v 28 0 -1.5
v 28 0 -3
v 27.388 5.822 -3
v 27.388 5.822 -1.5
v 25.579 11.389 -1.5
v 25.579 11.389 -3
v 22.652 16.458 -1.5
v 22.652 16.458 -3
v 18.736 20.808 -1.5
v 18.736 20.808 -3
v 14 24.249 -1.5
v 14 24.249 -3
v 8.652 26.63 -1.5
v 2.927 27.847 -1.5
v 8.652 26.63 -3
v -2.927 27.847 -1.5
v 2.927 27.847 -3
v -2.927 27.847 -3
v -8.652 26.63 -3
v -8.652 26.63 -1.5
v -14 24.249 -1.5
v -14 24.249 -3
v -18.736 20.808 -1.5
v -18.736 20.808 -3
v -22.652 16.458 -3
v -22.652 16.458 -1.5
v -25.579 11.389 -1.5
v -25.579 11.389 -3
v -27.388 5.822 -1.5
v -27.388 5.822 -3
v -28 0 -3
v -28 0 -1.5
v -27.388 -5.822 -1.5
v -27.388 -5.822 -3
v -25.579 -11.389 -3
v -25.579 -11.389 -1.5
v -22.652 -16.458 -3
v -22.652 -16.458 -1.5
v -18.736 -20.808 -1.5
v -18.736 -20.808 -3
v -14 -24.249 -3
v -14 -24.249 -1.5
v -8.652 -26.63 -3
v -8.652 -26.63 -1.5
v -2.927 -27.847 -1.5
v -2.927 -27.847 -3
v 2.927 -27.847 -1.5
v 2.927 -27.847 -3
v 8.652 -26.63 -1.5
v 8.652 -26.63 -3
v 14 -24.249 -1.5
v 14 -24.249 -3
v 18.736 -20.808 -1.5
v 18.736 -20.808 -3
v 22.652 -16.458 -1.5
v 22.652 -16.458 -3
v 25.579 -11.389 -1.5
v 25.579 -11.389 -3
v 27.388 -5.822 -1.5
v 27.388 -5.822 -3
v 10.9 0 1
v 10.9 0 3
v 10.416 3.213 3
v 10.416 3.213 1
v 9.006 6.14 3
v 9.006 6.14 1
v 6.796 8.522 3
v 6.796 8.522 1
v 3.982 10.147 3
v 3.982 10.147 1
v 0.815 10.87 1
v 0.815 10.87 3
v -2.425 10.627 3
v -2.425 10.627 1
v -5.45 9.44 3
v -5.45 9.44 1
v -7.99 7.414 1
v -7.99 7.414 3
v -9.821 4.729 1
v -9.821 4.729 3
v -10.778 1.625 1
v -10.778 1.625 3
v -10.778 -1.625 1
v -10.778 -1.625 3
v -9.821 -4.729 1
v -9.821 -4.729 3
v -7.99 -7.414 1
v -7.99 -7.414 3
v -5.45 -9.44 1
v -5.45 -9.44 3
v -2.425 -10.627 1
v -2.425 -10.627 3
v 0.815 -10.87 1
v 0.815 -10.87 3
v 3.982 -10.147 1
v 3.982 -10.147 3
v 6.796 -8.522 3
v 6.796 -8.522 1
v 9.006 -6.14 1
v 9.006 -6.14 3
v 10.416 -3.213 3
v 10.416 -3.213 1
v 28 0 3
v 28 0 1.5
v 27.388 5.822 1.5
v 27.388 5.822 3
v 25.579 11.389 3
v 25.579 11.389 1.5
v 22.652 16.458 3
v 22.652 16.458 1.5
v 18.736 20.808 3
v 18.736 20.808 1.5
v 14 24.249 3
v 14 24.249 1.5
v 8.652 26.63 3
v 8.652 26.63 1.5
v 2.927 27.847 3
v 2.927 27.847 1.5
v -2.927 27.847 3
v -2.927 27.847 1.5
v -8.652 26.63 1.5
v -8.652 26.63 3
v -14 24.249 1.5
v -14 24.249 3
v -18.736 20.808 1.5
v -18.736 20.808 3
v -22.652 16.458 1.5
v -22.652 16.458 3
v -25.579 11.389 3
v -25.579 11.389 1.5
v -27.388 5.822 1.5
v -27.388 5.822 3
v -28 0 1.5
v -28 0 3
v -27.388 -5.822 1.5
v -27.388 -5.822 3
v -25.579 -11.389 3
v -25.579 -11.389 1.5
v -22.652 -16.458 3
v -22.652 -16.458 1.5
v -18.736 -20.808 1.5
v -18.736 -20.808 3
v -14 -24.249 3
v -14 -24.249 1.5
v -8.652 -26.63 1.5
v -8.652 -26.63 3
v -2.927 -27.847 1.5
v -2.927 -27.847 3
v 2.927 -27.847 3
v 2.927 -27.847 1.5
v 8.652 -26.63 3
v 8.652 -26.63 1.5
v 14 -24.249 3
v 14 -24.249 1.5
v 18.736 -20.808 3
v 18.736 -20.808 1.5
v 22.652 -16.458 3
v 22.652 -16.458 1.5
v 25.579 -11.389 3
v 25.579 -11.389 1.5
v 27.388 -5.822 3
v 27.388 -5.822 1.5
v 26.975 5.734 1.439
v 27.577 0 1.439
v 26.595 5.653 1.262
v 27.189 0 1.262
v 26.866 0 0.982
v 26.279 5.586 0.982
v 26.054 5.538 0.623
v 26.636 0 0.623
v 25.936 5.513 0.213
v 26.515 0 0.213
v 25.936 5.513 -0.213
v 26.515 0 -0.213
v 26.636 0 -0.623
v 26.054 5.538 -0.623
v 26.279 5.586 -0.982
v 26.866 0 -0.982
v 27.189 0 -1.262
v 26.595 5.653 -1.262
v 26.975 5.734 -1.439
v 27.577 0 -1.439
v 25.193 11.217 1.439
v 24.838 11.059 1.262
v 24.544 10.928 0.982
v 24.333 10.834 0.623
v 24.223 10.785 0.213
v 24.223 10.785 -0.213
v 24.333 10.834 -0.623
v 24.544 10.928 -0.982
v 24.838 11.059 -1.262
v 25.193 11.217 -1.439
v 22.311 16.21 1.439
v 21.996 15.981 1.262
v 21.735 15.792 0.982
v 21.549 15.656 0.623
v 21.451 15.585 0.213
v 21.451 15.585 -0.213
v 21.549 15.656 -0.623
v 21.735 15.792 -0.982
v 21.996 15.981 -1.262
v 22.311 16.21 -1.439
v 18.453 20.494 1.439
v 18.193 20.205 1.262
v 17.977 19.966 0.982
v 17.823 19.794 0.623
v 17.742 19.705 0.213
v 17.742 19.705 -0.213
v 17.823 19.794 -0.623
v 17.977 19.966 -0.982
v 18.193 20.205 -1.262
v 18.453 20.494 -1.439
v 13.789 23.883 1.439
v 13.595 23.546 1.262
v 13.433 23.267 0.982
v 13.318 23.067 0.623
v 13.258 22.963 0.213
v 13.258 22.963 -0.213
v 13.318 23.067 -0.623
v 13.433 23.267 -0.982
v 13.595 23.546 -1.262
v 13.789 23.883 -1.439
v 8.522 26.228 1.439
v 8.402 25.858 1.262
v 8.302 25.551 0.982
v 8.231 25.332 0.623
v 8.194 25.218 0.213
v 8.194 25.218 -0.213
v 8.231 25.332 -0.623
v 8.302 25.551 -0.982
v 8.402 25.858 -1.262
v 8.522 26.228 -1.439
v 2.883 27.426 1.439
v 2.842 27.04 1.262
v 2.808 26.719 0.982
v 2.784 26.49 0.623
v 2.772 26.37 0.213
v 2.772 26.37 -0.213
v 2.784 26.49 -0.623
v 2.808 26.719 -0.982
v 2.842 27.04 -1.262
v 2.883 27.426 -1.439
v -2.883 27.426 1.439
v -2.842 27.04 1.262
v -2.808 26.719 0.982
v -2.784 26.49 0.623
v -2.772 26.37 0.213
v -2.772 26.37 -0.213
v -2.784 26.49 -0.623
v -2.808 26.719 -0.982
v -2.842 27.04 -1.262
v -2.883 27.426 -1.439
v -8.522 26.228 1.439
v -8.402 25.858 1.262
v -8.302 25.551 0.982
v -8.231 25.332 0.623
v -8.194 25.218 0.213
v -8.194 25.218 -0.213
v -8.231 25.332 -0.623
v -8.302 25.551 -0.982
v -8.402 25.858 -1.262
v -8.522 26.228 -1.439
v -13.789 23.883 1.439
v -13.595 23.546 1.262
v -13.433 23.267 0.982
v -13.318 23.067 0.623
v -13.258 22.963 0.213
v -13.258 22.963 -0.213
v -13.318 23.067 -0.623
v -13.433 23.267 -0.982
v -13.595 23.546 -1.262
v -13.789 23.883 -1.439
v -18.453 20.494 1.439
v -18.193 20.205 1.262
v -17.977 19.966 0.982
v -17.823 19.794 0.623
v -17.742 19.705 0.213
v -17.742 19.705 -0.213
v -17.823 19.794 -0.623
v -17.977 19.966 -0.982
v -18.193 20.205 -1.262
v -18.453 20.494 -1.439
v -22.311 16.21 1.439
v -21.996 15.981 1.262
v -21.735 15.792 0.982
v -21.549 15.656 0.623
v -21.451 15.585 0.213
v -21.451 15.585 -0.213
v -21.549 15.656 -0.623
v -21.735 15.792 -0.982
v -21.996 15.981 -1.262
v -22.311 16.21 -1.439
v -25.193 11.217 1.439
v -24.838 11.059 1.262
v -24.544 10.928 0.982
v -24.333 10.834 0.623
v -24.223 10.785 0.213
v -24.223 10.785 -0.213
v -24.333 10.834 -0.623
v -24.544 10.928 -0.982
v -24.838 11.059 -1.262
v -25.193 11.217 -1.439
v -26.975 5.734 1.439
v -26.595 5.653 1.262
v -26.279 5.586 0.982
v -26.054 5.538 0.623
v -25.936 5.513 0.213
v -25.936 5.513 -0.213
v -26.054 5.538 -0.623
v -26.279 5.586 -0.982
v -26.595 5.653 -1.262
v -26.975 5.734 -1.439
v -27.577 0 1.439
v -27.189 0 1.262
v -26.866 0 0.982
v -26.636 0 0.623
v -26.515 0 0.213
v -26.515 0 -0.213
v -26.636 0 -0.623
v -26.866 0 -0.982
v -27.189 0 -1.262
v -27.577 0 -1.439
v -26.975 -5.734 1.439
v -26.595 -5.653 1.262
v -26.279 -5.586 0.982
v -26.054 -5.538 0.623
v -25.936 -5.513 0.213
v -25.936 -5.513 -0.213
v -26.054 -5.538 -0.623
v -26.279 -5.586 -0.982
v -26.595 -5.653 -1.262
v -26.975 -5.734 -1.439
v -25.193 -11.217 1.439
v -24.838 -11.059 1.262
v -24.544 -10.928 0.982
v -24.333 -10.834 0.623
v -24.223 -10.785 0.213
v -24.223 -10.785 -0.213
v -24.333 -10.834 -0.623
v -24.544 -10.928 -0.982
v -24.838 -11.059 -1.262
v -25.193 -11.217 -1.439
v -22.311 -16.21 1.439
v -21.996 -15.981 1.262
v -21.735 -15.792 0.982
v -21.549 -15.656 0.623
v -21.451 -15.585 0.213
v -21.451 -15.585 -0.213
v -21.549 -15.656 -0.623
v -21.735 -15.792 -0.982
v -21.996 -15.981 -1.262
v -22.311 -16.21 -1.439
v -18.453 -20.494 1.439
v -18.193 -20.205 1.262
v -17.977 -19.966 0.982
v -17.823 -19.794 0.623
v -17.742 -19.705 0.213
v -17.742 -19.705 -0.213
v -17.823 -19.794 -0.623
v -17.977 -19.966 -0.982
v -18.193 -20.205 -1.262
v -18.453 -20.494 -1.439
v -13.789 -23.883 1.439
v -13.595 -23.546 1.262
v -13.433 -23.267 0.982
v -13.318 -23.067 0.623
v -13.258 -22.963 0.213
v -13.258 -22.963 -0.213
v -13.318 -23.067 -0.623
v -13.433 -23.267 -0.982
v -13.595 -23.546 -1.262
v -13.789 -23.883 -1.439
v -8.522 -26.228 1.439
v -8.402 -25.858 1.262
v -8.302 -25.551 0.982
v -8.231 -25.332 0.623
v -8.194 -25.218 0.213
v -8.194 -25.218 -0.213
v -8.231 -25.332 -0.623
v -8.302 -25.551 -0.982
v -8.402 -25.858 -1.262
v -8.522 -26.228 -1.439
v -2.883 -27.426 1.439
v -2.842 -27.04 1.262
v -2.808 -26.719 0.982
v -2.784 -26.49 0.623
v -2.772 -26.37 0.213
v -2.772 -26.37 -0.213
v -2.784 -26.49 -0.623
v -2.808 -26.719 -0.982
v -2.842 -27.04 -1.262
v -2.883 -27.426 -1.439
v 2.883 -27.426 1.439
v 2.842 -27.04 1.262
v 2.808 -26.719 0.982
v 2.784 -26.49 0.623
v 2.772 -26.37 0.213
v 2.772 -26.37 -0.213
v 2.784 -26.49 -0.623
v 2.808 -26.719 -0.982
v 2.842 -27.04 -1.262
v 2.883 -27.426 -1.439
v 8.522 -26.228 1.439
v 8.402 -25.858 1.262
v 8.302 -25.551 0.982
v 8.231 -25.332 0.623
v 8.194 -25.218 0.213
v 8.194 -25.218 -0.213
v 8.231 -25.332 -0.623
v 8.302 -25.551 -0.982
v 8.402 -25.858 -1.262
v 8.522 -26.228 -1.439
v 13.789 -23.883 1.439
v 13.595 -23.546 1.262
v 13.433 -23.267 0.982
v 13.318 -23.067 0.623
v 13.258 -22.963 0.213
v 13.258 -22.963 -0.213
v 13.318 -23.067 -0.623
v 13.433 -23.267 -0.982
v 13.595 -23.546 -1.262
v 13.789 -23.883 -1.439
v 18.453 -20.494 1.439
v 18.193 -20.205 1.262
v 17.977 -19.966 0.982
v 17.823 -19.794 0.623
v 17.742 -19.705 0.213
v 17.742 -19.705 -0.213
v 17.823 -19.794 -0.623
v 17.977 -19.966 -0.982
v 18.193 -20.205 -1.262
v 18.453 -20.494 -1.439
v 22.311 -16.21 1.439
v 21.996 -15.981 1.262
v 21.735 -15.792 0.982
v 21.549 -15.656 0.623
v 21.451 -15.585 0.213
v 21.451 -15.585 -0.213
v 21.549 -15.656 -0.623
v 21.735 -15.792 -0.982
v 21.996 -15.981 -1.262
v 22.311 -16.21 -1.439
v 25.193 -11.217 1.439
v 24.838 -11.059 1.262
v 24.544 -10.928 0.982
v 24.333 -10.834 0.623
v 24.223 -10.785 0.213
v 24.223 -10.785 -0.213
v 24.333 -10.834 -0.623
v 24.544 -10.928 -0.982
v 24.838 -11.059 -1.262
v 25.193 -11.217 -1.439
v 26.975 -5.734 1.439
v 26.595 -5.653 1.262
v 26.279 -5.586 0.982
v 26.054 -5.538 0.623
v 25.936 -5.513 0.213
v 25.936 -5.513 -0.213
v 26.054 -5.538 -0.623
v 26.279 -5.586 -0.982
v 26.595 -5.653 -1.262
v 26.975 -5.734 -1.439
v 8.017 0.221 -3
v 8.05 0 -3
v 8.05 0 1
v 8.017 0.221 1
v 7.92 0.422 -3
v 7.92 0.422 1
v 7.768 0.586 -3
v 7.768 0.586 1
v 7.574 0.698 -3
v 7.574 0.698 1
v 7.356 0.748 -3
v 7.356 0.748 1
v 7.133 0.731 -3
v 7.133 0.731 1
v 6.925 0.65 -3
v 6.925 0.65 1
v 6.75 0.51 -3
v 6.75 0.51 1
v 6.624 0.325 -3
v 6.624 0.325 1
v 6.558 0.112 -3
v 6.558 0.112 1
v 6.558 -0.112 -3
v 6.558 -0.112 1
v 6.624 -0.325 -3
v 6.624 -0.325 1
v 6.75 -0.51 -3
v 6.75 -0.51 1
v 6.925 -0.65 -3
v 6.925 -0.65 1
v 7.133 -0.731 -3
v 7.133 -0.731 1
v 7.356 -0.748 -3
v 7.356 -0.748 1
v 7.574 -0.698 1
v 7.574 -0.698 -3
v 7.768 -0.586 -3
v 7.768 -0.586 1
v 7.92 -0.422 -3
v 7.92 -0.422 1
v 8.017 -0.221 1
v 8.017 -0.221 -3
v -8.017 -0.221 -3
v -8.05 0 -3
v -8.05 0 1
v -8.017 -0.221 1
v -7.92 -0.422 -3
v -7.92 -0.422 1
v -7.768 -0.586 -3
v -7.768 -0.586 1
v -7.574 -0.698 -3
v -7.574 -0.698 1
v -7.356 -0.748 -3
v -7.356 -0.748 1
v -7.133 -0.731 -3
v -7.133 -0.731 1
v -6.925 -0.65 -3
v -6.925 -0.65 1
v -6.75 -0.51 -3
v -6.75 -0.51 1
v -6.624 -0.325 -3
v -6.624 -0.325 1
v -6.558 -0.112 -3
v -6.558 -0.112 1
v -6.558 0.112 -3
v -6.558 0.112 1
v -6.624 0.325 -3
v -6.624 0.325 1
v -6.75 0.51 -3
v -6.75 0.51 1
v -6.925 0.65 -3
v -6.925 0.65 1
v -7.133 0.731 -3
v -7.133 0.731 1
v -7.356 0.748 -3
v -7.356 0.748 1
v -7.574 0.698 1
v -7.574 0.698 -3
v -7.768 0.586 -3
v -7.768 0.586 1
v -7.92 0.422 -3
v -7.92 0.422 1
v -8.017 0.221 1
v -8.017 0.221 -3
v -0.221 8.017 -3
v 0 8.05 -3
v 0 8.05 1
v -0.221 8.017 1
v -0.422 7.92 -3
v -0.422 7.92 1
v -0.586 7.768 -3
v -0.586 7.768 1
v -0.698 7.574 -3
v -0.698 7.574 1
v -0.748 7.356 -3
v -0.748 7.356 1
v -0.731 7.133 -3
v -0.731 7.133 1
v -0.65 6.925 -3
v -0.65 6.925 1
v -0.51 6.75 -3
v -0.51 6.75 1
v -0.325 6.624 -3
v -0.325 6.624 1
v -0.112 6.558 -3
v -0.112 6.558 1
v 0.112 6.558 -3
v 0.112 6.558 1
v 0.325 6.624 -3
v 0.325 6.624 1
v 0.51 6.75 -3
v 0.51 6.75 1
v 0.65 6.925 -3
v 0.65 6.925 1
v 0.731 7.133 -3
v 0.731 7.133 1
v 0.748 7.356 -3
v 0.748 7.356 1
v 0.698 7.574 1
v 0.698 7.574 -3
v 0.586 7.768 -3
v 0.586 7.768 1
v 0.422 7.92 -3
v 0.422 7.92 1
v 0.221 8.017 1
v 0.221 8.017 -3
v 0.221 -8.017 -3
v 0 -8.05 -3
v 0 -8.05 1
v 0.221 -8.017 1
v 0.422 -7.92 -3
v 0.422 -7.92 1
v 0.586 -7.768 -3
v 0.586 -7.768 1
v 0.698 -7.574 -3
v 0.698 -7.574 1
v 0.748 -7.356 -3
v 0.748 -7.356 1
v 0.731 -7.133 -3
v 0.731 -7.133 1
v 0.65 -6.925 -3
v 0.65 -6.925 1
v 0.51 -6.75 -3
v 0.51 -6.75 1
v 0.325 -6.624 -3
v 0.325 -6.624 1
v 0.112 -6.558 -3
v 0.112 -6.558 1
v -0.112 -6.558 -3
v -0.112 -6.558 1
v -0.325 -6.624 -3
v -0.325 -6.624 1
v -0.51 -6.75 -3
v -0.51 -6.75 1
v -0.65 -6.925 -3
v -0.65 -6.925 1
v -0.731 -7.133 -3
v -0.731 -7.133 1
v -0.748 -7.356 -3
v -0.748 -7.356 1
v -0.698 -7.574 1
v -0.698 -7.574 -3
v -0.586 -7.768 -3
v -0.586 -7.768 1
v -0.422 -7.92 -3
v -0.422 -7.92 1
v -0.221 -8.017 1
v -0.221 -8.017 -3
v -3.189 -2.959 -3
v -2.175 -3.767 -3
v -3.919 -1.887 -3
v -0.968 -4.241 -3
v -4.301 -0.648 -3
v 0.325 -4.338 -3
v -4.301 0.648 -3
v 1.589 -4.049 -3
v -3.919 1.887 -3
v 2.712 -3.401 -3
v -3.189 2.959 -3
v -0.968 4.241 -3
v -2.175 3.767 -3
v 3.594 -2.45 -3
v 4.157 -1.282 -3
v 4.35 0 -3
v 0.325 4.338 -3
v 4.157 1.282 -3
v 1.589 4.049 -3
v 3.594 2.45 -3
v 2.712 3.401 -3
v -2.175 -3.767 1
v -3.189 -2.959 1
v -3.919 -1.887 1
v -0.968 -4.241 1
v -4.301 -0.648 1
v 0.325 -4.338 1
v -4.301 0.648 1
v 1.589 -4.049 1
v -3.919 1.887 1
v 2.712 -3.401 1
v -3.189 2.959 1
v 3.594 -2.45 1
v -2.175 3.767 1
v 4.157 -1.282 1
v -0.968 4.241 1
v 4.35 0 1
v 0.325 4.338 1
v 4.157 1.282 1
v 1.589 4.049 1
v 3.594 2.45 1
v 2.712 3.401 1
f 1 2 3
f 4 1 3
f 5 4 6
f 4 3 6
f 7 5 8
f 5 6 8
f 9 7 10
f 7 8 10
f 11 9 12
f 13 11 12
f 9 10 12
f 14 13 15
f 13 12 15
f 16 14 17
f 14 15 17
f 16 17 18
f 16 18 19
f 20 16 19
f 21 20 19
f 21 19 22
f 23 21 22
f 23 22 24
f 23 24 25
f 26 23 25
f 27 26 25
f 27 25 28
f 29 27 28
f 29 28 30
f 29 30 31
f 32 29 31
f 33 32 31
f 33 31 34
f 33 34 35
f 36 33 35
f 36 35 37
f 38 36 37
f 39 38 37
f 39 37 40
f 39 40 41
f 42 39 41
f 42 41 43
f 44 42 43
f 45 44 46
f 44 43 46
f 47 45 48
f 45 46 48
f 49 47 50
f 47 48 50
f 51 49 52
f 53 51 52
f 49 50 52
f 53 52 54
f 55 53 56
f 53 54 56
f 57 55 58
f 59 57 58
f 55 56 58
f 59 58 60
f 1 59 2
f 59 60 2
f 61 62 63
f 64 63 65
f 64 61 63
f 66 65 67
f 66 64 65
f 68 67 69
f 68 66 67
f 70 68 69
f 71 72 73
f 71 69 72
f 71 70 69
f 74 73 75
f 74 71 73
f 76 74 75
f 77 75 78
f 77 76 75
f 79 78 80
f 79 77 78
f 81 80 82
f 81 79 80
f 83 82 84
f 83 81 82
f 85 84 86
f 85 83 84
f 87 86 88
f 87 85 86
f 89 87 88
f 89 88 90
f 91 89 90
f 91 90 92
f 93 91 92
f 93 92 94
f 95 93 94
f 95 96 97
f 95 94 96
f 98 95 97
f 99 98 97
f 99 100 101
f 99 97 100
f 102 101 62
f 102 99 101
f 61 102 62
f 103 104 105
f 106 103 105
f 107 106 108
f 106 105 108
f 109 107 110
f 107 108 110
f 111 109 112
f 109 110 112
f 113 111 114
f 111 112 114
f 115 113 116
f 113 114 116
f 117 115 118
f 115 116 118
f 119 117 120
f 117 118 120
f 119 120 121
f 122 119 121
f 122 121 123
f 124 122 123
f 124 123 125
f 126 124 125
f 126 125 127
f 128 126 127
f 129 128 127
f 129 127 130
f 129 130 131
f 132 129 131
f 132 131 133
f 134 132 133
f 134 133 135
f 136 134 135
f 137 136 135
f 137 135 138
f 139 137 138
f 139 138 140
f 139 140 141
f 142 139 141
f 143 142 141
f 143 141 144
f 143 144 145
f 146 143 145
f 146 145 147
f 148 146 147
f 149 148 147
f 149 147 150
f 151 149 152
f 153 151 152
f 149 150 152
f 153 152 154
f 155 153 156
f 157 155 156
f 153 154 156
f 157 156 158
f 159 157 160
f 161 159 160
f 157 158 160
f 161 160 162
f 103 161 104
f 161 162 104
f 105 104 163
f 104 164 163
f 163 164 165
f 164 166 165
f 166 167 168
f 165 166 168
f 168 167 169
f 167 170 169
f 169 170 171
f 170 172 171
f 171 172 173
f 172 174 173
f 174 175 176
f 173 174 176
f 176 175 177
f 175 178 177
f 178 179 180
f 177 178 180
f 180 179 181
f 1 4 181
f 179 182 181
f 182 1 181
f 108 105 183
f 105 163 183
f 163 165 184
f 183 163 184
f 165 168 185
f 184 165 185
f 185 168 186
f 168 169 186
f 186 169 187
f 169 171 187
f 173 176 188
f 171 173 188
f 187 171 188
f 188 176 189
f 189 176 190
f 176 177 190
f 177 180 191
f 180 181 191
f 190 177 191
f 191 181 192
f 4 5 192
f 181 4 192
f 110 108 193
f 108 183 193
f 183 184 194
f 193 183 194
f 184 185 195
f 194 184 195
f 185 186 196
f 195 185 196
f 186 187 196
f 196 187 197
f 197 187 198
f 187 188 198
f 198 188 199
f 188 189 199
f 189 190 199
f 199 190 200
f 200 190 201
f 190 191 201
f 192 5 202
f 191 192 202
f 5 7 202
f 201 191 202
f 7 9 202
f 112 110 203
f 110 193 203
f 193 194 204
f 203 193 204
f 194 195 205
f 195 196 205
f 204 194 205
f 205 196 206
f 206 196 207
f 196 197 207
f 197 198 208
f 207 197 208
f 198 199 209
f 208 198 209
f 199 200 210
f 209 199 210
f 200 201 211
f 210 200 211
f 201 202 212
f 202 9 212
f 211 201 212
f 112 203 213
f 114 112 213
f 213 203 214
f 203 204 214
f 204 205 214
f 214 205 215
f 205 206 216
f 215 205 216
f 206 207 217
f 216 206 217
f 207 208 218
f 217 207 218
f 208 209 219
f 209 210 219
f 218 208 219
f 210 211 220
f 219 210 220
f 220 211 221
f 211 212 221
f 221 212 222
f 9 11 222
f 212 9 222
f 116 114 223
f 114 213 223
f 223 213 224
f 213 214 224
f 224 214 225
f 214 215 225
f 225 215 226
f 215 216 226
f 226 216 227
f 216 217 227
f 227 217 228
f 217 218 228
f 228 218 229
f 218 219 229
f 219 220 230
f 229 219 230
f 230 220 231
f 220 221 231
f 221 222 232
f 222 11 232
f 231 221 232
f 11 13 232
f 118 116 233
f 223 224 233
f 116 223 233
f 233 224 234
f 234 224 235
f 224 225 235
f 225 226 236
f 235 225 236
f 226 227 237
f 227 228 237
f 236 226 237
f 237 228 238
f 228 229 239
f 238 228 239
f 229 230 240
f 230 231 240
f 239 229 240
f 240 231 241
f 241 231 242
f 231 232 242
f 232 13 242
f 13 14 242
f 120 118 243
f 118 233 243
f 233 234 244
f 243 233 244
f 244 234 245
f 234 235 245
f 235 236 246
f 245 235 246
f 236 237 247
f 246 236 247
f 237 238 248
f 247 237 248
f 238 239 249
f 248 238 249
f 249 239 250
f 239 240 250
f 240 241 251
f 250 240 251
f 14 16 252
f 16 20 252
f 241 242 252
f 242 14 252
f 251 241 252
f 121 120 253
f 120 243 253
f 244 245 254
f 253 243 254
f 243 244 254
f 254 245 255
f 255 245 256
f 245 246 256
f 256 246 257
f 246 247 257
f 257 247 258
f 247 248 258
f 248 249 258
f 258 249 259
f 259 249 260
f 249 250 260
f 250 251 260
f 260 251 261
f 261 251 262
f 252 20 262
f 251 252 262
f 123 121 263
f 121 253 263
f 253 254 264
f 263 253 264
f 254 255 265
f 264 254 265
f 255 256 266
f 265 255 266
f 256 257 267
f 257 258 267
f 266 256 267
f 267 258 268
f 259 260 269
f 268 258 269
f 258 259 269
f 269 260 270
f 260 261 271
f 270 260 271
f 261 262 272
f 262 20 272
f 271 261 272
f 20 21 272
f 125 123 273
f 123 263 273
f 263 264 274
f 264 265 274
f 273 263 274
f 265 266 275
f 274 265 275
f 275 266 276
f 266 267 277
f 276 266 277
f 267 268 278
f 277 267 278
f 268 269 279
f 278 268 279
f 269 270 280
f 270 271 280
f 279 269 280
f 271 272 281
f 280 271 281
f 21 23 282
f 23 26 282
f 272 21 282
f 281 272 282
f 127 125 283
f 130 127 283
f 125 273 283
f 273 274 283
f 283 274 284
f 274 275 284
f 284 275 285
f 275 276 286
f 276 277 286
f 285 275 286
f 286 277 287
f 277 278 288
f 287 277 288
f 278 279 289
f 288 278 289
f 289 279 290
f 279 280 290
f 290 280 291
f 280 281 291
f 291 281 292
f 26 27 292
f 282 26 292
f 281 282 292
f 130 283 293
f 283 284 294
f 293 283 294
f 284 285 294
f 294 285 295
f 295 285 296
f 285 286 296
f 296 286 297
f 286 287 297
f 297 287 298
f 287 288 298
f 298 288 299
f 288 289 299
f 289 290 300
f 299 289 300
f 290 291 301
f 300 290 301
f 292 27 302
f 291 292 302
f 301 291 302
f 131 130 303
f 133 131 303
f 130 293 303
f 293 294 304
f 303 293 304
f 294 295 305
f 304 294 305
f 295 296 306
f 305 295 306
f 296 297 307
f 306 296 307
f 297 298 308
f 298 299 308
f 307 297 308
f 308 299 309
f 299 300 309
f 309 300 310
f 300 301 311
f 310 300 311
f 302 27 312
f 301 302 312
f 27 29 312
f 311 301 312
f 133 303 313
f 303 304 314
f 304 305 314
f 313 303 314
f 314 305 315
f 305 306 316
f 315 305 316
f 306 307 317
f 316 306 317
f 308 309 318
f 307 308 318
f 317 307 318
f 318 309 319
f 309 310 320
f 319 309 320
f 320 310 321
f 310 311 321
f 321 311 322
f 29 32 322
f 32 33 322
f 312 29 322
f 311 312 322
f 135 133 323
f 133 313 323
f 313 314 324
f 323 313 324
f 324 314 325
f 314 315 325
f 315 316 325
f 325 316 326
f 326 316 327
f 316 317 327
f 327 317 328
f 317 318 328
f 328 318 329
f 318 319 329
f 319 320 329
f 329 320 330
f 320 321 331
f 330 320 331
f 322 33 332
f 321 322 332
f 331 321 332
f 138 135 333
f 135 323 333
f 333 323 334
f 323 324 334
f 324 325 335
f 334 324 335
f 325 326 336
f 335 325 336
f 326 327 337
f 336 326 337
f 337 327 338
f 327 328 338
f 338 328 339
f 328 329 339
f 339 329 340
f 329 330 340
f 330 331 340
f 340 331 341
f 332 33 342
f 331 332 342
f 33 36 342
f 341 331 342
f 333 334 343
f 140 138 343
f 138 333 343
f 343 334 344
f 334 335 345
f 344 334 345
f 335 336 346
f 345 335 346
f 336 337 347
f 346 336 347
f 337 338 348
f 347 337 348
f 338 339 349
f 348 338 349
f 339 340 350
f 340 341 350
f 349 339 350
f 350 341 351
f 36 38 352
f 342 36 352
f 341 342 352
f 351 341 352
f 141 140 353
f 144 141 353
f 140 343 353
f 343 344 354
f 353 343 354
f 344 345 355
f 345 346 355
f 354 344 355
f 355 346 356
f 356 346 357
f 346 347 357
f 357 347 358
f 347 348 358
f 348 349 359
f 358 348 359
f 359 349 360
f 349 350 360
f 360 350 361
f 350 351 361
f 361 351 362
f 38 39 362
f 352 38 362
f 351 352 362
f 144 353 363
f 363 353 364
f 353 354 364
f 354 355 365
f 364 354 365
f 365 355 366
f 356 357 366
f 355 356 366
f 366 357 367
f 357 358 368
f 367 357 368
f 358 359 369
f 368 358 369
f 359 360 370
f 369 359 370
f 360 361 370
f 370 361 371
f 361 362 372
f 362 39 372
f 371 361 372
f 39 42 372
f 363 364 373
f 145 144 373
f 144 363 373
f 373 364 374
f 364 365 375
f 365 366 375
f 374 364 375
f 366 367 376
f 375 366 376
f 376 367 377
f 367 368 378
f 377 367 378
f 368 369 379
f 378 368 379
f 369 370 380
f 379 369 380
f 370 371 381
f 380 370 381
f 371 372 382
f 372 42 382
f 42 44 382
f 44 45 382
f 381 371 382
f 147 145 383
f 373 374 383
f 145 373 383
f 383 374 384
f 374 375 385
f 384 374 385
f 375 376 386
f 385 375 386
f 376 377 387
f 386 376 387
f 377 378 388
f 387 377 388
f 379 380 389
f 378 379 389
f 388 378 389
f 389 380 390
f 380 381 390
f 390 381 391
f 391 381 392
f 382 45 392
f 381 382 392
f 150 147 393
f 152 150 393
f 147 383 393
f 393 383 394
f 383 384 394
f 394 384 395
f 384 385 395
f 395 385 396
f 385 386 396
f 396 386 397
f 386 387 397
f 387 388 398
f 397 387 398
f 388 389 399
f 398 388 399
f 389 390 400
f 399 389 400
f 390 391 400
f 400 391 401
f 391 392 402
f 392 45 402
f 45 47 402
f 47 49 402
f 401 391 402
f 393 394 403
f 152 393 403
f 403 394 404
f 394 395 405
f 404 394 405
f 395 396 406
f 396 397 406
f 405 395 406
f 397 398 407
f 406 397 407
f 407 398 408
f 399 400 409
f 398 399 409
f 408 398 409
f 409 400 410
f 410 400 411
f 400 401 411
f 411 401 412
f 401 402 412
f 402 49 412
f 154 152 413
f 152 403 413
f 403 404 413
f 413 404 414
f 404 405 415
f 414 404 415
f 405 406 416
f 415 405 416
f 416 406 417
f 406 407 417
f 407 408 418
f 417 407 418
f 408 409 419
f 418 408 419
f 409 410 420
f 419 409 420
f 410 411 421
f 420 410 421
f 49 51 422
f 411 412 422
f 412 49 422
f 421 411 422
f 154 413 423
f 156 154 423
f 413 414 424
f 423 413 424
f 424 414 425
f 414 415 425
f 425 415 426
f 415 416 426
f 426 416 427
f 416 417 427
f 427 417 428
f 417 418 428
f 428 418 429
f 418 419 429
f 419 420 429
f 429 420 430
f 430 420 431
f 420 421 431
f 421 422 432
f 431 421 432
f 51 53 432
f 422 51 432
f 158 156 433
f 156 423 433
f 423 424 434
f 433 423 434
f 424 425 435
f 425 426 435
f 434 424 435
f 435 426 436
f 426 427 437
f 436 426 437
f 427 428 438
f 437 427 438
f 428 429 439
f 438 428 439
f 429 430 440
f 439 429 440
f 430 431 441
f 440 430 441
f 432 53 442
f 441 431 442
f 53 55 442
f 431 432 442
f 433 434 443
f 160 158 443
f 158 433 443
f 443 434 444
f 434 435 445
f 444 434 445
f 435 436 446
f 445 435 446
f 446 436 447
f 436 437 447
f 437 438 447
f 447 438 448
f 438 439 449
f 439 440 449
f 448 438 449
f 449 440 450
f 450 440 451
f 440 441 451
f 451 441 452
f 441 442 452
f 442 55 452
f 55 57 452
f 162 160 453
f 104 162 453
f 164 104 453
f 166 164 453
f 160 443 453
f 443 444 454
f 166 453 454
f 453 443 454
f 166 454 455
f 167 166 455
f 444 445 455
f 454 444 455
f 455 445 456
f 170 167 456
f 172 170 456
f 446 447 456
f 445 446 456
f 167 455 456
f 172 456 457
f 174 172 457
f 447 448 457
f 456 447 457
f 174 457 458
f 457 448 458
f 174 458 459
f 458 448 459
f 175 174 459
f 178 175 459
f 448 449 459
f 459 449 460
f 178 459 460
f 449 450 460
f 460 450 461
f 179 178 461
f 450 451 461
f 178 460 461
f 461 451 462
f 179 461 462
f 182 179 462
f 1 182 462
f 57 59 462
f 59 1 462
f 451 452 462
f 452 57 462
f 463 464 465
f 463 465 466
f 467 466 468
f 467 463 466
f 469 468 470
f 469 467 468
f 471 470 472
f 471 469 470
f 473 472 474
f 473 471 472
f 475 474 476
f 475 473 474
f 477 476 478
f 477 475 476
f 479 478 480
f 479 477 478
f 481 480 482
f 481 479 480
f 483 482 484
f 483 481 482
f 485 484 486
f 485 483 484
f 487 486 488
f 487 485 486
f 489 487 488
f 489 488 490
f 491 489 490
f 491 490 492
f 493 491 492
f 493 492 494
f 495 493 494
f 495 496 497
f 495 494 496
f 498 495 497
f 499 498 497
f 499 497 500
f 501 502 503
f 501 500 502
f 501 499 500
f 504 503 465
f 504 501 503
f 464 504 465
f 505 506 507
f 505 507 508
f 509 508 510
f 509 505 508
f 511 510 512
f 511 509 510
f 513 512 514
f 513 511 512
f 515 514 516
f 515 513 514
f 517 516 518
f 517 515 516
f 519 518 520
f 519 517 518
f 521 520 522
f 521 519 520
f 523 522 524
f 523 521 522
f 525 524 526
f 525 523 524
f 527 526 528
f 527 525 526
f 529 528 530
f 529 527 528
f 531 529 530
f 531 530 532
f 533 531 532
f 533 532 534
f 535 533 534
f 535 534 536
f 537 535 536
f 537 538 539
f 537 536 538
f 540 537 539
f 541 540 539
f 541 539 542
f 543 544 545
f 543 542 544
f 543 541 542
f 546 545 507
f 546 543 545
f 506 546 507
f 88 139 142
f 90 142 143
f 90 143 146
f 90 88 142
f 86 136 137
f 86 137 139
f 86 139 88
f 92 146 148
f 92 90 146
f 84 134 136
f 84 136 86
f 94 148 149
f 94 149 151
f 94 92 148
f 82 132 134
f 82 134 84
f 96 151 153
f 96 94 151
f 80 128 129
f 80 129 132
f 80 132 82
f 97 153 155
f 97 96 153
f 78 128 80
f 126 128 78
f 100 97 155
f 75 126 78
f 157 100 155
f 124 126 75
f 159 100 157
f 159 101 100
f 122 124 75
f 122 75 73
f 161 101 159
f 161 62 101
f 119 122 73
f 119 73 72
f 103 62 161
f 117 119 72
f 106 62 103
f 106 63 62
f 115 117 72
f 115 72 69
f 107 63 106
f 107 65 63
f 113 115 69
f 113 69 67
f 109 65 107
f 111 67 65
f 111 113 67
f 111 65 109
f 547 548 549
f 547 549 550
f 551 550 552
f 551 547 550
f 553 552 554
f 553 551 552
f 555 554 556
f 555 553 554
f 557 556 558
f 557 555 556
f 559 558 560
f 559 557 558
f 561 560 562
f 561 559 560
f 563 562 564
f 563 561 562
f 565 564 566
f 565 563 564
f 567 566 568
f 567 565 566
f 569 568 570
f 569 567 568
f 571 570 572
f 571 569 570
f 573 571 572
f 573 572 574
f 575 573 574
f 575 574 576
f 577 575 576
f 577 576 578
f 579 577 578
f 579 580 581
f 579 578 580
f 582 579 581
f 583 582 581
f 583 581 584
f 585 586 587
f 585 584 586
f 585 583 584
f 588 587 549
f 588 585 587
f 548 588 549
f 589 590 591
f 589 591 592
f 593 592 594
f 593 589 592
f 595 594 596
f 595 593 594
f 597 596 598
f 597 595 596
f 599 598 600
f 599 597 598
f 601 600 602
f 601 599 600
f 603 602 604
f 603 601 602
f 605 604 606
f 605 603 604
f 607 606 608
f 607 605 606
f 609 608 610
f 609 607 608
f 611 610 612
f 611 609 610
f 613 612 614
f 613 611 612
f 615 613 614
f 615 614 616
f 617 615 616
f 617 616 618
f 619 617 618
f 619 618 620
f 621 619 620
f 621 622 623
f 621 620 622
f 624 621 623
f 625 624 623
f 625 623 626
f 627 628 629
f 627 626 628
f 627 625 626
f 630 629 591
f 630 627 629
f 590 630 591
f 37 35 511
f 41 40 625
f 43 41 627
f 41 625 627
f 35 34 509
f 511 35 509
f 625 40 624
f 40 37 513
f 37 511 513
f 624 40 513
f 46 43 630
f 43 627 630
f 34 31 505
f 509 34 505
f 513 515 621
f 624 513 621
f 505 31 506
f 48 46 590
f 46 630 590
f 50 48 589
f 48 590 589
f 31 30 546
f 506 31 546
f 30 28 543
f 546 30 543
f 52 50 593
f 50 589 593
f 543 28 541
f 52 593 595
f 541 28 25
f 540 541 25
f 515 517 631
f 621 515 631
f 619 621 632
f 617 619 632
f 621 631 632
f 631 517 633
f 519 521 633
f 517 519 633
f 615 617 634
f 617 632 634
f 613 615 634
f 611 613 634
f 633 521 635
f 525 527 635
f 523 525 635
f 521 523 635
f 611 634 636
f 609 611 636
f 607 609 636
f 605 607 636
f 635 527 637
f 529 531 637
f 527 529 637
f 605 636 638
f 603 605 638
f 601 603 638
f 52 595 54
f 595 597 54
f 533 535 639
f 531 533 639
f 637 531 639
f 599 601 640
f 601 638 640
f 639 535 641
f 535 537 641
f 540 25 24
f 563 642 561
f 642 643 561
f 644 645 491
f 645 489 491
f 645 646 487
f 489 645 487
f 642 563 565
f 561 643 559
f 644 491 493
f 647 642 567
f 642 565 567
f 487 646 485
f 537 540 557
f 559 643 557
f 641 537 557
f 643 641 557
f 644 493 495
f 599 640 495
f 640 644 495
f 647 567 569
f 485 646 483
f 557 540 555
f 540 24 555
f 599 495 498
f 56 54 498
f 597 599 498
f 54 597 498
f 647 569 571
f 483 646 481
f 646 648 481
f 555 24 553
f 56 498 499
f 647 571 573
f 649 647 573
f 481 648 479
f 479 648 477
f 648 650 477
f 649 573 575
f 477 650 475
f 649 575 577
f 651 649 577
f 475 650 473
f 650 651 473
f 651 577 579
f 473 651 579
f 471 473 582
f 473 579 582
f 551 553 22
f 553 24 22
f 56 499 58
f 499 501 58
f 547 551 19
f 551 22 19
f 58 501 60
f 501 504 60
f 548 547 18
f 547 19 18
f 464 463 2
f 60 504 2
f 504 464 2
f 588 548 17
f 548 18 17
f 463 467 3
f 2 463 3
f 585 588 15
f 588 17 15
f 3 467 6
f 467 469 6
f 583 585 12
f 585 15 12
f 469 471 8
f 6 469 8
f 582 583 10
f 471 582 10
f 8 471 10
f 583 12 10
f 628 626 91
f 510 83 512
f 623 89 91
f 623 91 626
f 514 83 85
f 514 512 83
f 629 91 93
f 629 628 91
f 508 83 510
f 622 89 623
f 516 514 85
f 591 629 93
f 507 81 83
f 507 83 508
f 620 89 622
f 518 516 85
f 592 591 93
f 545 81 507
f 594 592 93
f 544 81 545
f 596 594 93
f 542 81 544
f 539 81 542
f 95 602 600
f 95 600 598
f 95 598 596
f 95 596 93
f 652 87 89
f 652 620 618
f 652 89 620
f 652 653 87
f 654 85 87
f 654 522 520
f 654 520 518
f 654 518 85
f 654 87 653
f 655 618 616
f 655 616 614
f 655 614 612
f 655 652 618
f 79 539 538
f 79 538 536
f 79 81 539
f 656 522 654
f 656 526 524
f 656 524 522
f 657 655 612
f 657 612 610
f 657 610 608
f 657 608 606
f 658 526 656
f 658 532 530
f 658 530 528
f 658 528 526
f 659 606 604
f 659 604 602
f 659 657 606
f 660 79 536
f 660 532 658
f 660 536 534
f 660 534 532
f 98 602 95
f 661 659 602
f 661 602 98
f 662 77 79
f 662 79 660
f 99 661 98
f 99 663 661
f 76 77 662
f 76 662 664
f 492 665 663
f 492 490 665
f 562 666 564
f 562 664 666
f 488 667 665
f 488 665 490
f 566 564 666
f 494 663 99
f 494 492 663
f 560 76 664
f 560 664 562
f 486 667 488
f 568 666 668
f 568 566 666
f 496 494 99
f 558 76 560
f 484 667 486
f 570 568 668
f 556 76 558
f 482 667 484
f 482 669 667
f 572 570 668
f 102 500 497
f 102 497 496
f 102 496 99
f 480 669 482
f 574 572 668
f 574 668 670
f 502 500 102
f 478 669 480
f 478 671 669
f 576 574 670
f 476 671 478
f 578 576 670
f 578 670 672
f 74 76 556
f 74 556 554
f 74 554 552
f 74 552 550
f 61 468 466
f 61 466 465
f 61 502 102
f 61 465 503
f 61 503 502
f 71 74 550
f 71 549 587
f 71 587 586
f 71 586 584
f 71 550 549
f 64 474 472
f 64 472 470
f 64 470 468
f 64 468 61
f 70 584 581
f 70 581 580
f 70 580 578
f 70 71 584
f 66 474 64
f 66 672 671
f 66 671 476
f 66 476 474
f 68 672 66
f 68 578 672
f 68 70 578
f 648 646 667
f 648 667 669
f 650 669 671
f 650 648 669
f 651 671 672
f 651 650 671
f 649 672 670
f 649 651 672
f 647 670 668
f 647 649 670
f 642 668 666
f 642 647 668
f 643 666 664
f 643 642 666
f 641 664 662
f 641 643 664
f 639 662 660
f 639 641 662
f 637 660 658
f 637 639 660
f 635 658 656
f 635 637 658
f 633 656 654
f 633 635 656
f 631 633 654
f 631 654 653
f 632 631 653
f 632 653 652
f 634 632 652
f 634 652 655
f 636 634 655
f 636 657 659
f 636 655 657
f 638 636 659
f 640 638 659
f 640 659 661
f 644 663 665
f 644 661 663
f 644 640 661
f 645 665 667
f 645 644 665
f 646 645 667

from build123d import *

# Parameters (mm, degrees)
CYLINDER003_R     = 0.75
CYLINDER003_DEPTH = 10
ARRAY_COUNT       = 4
CYLINDER002_R     = 4.35
CYLINDER002_DEPTH = 10
CYLINDER001_R     = 10.9
CYLINDER001_DEPTH = 10
TORUS_R           = 1.5
CYLINDER_R        = 28
CYLINDER_DEPTH    = 6


with BuildPart() as array:
    # Cylinder003 → Cylinder003 (new body)
    with BuildSketch(Plane(origin=(7.3, 0, -6), x_dir=(1, 0, 0), z_dir=(0, 0, 1))):
        Circle(CYLINDER003_R)
    extrude(amount=CYLINDER003_DEPTH)

    # Array: Array ×4 about axis
    array_axis = Axis((0, 0, 0), (0, 0, 1))


with BuildPart() as array_1:
    add(array.part)
    for i in range(1, ARRAY_COUNT):
        add(array.part.rotate(array_axis, i * 360 / ARRAY_COUNT))


with BuildPart() as hueco_eje:
    # Cylinder002 → Cylinder002 (new body)
    with BuildSketch(Plane.XY.offset(-6)):
        Circle(CYLINDER002_R)
    extrude(amount=CYLINDER002_DEPTH)


with BuildPart() as corona_servo:
    # Cylinder001 → Cylinder001 (new body)
    with BuildSketch(Plane.XY.offset(1)):
        Circle(CYLINDER001_R)
    extrude(amount=CYLINDER001_DEPTH)


with BuildPart() as hueco_junta_t_rica:
    # Torus → Torus (revolve)
    with BuildSketch(Plane.XZ):
        with Locations((28, 0)):
            Circle(TORUS_R)
    revolve(axis=Axis((0, 0, 0), (0, 0, 1)))


with BuildPart() as rueda_miniskybot:
    # Cylinder → Cylinder (new body)
    with BuildSketch(Plane.XY.offset(-3)):
        Circle(CYLINDER_R)
    extrude(amount=CYLINDER_DEPTH)

    # Cut: cut hueco-junta-tórica
    add(hueco_junta_t_rica.part, mode=Mode.SUBTRACT)

    # Cut001: cut corona servo
    add(corona_servo.part, mode=Mode.SUBTRACT)

    # Cut002: cut hueco-eje
    add(hueco_eje.part, mode=Mode.SUBTRACT)

    # Cut003: cut Array
    add(array_1.part, mode=Mode.SUBTRACT)


solid = rueda_miniskybot.part
